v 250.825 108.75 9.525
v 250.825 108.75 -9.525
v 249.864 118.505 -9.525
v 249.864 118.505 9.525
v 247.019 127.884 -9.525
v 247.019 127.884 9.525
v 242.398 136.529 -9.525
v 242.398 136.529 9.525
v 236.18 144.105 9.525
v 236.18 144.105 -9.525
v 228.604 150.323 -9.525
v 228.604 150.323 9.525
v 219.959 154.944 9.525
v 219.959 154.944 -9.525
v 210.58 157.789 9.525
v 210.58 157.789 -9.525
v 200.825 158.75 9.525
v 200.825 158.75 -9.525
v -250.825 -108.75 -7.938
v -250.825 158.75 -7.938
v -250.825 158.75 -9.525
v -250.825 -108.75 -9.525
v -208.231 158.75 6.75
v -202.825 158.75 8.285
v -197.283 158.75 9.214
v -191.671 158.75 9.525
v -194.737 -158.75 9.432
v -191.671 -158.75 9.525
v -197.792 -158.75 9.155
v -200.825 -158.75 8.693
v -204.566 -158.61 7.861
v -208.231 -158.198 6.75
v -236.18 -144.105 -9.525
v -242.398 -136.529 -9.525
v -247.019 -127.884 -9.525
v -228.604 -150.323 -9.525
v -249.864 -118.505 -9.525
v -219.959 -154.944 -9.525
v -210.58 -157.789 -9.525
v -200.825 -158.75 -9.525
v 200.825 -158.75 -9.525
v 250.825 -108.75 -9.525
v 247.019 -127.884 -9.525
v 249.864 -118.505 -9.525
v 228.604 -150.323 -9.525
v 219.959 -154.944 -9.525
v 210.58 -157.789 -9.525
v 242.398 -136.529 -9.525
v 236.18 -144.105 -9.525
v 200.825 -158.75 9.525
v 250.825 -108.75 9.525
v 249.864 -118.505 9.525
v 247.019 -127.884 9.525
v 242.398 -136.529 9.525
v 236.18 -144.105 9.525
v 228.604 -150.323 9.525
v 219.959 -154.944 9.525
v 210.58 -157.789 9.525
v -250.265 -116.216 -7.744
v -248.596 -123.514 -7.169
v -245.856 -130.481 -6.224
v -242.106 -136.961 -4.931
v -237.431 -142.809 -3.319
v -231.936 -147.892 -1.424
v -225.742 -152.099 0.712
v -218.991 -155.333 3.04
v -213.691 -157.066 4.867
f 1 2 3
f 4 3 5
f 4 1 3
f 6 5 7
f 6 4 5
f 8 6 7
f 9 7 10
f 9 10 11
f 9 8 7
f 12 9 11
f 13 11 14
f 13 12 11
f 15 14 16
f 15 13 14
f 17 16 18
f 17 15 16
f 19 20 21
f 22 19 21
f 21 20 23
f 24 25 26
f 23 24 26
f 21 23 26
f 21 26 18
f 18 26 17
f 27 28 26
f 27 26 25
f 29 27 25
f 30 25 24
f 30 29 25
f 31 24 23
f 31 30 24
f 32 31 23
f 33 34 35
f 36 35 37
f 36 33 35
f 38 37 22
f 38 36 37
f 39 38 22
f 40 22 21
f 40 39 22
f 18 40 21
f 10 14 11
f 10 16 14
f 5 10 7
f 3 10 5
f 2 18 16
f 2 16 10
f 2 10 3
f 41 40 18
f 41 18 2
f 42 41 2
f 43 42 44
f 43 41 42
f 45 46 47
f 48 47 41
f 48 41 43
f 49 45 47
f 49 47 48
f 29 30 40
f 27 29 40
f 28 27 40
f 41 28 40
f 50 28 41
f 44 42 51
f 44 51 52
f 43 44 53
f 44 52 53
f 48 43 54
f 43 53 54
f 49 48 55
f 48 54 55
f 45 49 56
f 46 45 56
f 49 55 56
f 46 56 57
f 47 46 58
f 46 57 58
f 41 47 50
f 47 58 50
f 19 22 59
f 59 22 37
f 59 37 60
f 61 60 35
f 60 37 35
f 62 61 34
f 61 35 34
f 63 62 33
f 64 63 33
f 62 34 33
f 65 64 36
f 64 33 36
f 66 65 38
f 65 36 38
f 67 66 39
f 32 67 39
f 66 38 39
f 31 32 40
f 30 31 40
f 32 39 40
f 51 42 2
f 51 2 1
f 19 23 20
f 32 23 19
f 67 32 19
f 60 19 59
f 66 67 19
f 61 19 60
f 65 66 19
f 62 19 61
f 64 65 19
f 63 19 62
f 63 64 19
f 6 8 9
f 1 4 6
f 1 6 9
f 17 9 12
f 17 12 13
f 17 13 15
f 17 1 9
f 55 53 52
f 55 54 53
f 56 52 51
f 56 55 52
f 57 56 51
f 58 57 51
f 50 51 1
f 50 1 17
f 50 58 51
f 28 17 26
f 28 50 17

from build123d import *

# Parameters (mm, degrees)
F1_DEPTH = 158.75
F2_R     = 50


with BuildPart() as f1:
    # F0 (on Front) → F1 (new body, symmetric)
    with BuildSketch(Plane.XZ):
        with BuildLine():
            Line((-200.025, -9.525), (250.825, -9.525))
            Line((250.825, -9.525), (250.825, 9.525))
            Line((250.825, 9.525), (-191.671143, 9.525))
            ThreePointArc((-191.671143, 9.525), (-200.066769, 8.826432), (-208.231493, 6.749939))
            Line((-208.231493, 6.749939), (-250.825, -7.9375))
            Line((-250.825, -7.9375), (-250.825, -9.525))
            Line((-250.825, -9.525), (-200.025, -9.525))
        make_face()
    extrude(amount=F1_DEPTH, both=True)

    # F2
    f2_edges = [f1.edges().sort_by_distance(p)[0] for p in [
        (-250.825, -158.75, -8.73125),
        (250.825, -158.75, 0),
        (250.825, 158.75, 0),
    ]]
    fillet(f2_edges, radius=F2_R)


solid = f1.part
